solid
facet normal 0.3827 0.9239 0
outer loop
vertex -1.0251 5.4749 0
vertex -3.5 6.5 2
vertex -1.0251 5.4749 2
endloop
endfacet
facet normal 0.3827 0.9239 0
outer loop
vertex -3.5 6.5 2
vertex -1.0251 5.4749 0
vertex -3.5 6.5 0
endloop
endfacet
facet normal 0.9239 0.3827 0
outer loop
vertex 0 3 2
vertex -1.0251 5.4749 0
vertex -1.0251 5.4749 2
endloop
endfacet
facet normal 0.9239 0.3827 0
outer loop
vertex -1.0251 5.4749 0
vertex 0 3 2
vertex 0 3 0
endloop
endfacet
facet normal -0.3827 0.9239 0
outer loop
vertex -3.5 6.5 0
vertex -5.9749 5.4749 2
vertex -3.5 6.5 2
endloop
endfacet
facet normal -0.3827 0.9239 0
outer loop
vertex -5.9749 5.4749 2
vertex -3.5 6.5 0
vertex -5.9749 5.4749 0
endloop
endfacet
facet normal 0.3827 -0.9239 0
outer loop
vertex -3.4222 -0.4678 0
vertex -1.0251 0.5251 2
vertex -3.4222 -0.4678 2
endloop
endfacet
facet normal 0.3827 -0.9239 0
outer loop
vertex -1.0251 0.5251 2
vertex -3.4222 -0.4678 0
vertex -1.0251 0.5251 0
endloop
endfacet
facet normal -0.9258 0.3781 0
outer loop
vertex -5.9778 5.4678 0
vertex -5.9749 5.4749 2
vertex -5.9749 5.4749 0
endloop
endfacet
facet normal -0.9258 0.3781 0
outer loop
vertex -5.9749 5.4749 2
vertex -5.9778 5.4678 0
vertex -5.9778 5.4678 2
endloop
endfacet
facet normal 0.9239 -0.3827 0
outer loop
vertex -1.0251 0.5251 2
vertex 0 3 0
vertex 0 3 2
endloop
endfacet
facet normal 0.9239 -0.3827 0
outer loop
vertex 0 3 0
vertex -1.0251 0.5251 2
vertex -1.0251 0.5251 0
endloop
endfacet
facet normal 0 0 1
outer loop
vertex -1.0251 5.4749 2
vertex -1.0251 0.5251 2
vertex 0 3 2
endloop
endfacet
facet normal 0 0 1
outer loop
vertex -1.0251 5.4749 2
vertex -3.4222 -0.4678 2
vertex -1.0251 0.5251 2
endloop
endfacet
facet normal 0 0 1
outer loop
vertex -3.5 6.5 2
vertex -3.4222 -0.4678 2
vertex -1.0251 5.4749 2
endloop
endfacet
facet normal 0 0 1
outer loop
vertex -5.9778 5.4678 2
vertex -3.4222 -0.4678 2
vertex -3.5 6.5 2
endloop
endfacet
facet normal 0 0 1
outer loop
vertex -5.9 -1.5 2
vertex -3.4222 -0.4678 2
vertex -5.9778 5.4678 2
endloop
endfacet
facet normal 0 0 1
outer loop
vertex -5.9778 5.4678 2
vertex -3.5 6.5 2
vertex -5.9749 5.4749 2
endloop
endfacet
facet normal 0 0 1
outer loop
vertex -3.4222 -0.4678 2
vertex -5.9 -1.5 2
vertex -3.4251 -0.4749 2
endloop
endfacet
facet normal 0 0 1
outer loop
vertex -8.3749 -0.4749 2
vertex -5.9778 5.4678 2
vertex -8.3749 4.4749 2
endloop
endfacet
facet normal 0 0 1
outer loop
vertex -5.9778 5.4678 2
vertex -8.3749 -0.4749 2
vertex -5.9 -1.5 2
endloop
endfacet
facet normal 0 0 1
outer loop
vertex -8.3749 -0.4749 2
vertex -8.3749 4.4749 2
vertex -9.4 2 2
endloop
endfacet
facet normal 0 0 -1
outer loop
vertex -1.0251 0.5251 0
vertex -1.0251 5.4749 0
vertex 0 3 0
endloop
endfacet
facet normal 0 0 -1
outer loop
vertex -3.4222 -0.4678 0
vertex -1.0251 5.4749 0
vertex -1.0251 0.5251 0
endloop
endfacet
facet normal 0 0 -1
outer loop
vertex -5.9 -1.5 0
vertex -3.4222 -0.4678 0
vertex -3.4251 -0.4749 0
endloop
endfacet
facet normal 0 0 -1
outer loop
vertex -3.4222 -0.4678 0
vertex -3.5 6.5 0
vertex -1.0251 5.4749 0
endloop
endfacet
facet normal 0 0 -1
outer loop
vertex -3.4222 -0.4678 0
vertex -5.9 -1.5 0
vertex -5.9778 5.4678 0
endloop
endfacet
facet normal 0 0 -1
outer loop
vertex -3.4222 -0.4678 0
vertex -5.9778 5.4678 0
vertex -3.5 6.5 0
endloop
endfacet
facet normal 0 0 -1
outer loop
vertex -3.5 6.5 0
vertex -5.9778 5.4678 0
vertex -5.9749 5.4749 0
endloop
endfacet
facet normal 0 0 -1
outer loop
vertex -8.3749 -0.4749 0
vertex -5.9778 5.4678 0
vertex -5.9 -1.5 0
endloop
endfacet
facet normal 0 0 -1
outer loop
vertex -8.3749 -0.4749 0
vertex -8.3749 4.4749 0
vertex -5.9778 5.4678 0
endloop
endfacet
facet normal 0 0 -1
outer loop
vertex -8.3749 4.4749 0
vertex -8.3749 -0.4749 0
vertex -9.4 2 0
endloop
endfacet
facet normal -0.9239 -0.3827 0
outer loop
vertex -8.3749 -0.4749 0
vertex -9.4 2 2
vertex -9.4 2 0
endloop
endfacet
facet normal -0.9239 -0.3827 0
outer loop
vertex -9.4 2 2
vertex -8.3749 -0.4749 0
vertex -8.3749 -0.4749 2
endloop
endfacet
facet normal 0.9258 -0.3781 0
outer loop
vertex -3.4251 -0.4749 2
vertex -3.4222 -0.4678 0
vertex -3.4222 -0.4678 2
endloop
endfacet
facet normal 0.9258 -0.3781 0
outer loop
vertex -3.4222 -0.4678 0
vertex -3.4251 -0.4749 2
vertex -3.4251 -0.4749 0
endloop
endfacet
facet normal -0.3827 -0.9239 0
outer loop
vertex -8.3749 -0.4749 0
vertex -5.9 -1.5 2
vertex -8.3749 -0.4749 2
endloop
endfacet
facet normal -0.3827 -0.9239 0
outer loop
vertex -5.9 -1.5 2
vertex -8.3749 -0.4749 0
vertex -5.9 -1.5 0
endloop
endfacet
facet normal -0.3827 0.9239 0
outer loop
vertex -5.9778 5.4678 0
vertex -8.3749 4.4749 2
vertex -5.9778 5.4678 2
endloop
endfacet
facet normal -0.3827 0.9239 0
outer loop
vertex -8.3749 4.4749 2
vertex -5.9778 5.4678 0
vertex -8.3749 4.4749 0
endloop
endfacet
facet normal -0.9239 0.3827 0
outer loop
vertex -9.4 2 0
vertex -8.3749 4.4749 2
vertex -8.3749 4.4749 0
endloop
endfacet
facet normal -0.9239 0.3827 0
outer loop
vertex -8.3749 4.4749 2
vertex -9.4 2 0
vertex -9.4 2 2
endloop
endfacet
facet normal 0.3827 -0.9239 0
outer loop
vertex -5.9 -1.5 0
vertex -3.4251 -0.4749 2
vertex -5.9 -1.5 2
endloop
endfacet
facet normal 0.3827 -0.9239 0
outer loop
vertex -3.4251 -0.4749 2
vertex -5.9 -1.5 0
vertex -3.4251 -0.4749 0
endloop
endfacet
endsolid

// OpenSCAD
//creating cubes for the first assignent

//Question-1

//cube([2.5, 2, 2]);
//translate([2, -2, 0]){
//    cube([3.5, 6, 2]);
//    translate([3, -2, 0]){
//        cube([2, 10, 2]);
//    }   
//}




//Question -2
//color("cyan"){
//cube([2.5, 2, 4]);
//translate([2, 0, 0]){
//    cube([4.5, 4, 4]);
//    translate([4, 0, 0]){
//       cube([2.5, 8, 4]); 
//       translate([2, 0, 0]){
//           cube([2, 10, 4]);  
//        } 
//    }
//    
//}
//}






// Question -3 

//color("green", 1){
  //  difference(){
    //    cube([3, 5, 2]);
      //  translate([0.02, 0.02, 0.02]){
        //    cube([2.9, 5, 2]);
//    }  
//  }
//}
//color("green", 1){
 //   translate([-3, 5, 0]){
   // difference(){
     //   cube([9, 3, 2]);
       // translate([0.02, 0.02, 0.02]){
         //   cube([8.9, 2.9, 2]);
   // }  
//}
//}
//color("green", 1){
  //  translate([-1.5, 8, 0]){
    //difference(){
      //  cube([6, 1, 2]);
        //translate([0.02, 0.02, 0.02]){
          //  cube([5.9, 0.9, 2]);
   // }  
//}
//}
//}
//}






//Question - 4
//color("#53FAAF", 1){
  //  cube([2, 4, 3]);
    //translate([2, -2,0]){
      //  cube([4, 8, 3]);
        //translate([4, -4, 0]){
          //  cube([2, 16, 3]);
            //translate([2, -2, 0]){
              //  cube([4, 20, 3]);
                //translate([4, 2, 0]){
                  //  cube([2, 16, 3]);
                //}
            //}
        //}
    //}
//}







//Question - 5
//color("#42CFB6"){
  //  cube([20, 3, 10]);
    //translate([4.49, 0,4.62]){
      //  rotate([0, -40, 0]){
        //cube([13.1, 3, 7]);
        //}
    //}
    //translate([5.54, 0,13]){
      //  rotate([0, 40, 0]){
        //cube([13, 3, 7]);
        //}
    //}
//}






//Question - 6
color("#42CFB6"){
        translate([-3.5, 3, 0]){
            cylinder(r=3.5, h=2, $fn=8);
}
        translate([-5.9, 2, 0]){
            cylinder(r=3.5, h=2, $fn=8);
}
}
